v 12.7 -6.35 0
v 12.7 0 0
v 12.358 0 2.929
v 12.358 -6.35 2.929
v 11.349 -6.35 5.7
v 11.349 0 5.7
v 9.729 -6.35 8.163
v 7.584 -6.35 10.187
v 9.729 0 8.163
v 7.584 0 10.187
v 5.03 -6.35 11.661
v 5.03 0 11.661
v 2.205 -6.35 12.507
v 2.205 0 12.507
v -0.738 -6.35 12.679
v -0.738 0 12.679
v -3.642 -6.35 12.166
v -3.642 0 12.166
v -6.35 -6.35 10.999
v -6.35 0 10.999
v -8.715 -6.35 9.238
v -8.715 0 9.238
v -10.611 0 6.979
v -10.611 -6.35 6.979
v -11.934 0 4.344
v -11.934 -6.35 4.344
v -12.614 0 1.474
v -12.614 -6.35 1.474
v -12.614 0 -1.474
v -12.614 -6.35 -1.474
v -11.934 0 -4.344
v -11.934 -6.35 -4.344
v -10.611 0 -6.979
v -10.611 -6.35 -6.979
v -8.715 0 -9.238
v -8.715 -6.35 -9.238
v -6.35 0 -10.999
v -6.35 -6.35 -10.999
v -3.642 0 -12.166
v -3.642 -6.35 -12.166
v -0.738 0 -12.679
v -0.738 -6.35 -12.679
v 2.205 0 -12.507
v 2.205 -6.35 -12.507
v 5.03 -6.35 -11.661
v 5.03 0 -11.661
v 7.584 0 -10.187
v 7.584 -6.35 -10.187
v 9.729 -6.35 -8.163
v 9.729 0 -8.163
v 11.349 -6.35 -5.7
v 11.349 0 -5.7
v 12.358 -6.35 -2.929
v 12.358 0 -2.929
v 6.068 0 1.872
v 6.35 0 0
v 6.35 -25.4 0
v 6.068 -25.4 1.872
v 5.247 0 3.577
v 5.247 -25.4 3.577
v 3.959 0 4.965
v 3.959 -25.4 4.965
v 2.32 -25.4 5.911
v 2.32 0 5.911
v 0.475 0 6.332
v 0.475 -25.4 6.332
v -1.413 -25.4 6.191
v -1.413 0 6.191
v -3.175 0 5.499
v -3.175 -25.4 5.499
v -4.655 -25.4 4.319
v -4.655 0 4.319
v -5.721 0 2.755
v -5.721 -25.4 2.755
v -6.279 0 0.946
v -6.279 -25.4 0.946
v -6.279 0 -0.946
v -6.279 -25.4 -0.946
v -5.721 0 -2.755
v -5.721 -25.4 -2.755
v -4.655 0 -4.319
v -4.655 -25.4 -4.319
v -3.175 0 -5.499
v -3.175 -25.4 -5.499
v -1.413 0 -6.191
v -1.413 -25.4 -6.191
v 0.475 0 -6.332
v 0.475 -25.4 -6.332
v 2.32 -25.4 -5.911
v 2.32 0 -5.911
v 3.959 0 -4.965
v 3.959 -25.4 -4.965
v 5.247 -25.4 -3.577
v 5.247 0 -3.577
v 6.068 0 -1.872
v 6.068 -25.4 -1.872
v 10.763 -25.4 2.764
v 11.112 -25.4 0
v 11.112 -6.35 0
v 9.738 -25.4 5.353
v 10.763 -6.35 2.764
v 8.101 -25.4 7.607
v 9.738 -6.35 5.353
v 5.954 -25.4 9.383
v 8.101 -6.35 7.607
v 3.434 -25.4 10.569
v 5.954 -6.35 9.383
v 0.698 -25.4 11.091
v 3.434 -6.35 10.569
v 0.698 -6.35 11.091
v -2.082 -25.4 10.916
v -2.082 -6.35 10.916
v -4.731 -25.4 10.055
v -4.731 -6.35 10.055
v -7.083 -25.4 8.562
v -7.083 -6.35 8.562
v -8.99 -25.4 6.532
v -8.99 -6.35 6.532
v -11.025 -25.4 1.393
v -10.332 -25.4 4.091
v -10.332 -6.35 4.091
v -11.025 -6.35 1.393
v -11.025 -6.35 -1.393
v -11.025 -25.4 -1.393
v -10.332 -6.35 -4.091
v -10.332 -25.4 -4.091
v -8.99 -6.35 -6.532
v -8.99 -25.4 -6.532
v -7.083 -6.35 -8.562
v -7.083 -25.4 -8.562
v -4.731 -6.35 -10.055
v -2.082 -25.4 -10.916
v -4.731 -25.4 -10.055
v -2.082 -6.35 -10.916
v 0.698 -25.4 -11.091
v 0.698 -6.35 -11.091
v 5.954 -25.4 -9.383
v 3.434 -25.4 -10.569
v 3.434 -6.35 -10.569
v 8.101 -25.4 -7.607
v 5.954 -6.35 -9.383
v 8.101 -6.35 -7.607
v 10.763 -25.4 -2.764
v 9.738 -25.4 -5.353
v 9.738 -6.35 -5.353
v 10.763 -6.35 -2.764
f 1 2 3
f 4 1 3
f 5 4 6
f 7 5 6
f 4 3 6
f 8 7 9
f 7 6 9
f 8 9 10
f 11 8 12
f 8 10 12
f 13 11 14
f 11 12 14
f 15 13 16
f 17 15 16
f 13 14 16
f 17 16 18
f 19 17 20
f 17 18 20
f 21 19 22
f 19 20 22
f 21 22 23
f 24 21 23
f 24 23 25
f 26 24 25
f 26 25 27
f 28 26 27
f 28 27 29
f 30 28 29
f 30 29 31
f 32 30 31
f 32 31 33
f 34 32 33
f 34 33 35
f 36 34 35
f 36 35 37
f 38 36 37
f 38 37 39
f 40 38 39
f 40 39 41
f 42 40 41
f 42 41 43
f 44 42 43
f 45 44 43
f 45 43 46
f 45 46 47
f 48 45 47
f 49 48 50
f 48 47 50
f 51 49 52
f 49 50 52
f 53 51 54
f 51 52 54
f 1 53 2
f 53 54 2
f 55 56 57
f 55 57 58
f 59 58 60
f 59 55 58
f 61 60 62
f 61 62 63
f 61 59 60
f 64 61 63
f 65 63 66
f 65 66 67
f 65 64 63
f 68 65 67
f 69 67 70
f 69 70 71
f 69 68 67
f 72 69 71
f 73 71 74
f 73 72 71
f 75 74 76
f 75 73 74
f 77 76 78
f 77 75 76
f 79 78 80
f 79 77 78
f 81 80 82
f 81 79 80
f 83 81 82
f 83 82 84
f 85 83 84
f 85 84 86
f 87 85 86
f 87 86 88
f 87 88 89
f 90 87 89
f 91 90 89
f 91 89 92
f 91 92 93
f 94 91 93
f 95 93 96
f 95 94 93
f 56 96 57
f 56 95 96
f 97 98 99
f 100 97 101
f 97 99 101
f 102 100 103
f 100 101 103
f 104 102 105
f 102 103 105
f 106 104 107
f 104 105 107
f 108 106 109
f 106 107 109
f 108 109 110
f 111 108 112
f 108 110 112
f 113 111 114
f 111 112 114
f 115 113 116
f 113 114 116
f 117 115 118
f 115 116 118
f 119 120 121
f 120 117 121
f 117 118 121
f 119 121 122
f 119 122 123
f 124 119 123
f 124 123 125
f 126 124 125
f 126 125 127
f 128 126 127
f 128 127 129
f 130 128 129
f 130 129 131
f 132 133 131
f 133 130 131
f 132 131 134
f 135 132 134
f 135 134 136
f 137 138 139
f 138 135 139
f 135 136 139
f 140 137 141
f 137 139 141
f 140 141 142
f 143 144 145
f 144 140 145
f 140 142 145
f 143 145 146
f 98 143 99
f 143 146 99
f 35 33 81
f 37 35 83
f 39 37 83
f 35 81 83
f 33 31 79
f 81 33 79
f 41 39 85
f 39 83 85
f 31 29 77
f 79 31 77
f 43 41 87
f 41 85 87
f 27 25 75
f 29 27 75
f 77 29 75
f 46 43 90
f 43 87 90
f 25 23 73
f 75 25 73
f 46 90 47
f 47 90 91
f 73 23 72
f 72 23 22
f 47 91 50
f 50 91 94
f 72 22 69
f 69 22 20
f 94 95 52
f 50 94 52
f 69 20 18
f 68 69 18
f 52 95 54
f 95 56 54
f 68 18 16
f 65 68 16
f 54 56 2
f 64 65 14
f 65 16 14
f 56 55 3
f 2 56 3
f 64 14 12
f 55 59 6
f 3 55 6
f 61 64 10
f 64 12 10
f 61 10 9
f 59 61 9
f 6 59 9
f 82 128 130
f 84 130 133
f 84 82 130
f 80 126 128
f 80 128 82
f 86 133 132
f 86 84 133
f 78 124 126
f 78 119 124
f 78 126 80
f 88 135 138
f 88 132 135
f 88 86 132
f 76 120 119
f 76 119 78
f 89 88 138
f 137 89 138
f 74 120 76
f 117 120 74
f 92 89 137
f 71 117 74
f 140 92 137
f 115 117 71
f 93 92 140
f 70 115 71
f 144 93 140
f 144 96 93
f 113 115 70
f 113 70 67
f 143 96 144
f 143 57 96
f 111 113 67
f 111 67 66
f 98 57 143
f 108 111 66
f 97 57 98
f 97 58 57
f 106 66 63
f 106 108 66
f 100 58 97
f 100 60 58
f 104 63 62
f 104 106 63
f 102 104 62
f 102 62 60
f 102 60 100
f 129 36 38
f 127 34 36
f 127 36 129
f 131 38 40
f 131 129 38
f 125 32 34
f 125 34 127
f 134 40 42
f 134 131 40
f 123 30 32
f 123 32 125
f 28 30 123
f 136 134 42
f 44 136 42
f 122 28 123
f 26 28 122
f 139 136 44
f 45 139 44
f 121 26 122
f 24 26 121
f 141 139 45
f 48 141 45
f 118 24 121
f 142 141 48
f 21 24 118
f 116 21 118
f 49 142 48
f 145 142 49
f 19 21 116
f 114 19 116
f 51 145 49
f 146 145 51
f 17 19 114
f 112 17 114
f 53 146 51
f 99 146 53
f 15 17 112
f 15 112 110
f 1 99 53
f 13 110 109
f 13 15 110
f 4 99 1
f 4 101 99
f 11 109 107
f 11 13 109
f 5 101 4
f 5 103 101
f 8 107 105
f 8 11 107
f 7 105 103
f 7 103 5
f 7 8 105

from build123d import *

# Parameters (mm, degrees)
F0_R     = 12.7
F0_R_2   = 6.35
F1_DEPTH = 25.4
F2_R     = 3.3782
F3_DEPTH = 6.35
F4_R     = 12.7
F4_R_2   = 11.1125
F5_DEPTH = 25.4
F6_R     = 4.2799
F7_DEPTH = 25.4


with BuildPart() as f1:
    # F0 (on Front) → F1 (new body)
    with BuildSketch(Plane.XZ):
        Circle(F0_R)
        Circle(F0_R_2, mode=Mode.SUBTRACT)
    extrude(amount=F1_DEPTH)

    # F4 (on face) → F5 (cut)
    with BuildSketch(Plane.XZ.offset(6.35)):
        Circle(F4_R)
        Circle(F4_R_2, mode=Mode.SUBTRACT)
    extrude(amount=F5_DEPTH, mode=Mode.SUBTRACT)


with BuildPart() as f3:
    # F2 (on Front) → F3 (new body)
    with BuildSketch(Plane.XZ):
        Circle(F2_R)
    extrude(amount=F3_DEPTH)

    # F6 (on face) → F7 (cut)
    with BuildSketch(Plane.XZ.offset(6.35)):
        Circle(F6_R)
    extrude(amount=-F7_DEPTH, mode=Mode.SUBTRACT)


solid = f1.part
